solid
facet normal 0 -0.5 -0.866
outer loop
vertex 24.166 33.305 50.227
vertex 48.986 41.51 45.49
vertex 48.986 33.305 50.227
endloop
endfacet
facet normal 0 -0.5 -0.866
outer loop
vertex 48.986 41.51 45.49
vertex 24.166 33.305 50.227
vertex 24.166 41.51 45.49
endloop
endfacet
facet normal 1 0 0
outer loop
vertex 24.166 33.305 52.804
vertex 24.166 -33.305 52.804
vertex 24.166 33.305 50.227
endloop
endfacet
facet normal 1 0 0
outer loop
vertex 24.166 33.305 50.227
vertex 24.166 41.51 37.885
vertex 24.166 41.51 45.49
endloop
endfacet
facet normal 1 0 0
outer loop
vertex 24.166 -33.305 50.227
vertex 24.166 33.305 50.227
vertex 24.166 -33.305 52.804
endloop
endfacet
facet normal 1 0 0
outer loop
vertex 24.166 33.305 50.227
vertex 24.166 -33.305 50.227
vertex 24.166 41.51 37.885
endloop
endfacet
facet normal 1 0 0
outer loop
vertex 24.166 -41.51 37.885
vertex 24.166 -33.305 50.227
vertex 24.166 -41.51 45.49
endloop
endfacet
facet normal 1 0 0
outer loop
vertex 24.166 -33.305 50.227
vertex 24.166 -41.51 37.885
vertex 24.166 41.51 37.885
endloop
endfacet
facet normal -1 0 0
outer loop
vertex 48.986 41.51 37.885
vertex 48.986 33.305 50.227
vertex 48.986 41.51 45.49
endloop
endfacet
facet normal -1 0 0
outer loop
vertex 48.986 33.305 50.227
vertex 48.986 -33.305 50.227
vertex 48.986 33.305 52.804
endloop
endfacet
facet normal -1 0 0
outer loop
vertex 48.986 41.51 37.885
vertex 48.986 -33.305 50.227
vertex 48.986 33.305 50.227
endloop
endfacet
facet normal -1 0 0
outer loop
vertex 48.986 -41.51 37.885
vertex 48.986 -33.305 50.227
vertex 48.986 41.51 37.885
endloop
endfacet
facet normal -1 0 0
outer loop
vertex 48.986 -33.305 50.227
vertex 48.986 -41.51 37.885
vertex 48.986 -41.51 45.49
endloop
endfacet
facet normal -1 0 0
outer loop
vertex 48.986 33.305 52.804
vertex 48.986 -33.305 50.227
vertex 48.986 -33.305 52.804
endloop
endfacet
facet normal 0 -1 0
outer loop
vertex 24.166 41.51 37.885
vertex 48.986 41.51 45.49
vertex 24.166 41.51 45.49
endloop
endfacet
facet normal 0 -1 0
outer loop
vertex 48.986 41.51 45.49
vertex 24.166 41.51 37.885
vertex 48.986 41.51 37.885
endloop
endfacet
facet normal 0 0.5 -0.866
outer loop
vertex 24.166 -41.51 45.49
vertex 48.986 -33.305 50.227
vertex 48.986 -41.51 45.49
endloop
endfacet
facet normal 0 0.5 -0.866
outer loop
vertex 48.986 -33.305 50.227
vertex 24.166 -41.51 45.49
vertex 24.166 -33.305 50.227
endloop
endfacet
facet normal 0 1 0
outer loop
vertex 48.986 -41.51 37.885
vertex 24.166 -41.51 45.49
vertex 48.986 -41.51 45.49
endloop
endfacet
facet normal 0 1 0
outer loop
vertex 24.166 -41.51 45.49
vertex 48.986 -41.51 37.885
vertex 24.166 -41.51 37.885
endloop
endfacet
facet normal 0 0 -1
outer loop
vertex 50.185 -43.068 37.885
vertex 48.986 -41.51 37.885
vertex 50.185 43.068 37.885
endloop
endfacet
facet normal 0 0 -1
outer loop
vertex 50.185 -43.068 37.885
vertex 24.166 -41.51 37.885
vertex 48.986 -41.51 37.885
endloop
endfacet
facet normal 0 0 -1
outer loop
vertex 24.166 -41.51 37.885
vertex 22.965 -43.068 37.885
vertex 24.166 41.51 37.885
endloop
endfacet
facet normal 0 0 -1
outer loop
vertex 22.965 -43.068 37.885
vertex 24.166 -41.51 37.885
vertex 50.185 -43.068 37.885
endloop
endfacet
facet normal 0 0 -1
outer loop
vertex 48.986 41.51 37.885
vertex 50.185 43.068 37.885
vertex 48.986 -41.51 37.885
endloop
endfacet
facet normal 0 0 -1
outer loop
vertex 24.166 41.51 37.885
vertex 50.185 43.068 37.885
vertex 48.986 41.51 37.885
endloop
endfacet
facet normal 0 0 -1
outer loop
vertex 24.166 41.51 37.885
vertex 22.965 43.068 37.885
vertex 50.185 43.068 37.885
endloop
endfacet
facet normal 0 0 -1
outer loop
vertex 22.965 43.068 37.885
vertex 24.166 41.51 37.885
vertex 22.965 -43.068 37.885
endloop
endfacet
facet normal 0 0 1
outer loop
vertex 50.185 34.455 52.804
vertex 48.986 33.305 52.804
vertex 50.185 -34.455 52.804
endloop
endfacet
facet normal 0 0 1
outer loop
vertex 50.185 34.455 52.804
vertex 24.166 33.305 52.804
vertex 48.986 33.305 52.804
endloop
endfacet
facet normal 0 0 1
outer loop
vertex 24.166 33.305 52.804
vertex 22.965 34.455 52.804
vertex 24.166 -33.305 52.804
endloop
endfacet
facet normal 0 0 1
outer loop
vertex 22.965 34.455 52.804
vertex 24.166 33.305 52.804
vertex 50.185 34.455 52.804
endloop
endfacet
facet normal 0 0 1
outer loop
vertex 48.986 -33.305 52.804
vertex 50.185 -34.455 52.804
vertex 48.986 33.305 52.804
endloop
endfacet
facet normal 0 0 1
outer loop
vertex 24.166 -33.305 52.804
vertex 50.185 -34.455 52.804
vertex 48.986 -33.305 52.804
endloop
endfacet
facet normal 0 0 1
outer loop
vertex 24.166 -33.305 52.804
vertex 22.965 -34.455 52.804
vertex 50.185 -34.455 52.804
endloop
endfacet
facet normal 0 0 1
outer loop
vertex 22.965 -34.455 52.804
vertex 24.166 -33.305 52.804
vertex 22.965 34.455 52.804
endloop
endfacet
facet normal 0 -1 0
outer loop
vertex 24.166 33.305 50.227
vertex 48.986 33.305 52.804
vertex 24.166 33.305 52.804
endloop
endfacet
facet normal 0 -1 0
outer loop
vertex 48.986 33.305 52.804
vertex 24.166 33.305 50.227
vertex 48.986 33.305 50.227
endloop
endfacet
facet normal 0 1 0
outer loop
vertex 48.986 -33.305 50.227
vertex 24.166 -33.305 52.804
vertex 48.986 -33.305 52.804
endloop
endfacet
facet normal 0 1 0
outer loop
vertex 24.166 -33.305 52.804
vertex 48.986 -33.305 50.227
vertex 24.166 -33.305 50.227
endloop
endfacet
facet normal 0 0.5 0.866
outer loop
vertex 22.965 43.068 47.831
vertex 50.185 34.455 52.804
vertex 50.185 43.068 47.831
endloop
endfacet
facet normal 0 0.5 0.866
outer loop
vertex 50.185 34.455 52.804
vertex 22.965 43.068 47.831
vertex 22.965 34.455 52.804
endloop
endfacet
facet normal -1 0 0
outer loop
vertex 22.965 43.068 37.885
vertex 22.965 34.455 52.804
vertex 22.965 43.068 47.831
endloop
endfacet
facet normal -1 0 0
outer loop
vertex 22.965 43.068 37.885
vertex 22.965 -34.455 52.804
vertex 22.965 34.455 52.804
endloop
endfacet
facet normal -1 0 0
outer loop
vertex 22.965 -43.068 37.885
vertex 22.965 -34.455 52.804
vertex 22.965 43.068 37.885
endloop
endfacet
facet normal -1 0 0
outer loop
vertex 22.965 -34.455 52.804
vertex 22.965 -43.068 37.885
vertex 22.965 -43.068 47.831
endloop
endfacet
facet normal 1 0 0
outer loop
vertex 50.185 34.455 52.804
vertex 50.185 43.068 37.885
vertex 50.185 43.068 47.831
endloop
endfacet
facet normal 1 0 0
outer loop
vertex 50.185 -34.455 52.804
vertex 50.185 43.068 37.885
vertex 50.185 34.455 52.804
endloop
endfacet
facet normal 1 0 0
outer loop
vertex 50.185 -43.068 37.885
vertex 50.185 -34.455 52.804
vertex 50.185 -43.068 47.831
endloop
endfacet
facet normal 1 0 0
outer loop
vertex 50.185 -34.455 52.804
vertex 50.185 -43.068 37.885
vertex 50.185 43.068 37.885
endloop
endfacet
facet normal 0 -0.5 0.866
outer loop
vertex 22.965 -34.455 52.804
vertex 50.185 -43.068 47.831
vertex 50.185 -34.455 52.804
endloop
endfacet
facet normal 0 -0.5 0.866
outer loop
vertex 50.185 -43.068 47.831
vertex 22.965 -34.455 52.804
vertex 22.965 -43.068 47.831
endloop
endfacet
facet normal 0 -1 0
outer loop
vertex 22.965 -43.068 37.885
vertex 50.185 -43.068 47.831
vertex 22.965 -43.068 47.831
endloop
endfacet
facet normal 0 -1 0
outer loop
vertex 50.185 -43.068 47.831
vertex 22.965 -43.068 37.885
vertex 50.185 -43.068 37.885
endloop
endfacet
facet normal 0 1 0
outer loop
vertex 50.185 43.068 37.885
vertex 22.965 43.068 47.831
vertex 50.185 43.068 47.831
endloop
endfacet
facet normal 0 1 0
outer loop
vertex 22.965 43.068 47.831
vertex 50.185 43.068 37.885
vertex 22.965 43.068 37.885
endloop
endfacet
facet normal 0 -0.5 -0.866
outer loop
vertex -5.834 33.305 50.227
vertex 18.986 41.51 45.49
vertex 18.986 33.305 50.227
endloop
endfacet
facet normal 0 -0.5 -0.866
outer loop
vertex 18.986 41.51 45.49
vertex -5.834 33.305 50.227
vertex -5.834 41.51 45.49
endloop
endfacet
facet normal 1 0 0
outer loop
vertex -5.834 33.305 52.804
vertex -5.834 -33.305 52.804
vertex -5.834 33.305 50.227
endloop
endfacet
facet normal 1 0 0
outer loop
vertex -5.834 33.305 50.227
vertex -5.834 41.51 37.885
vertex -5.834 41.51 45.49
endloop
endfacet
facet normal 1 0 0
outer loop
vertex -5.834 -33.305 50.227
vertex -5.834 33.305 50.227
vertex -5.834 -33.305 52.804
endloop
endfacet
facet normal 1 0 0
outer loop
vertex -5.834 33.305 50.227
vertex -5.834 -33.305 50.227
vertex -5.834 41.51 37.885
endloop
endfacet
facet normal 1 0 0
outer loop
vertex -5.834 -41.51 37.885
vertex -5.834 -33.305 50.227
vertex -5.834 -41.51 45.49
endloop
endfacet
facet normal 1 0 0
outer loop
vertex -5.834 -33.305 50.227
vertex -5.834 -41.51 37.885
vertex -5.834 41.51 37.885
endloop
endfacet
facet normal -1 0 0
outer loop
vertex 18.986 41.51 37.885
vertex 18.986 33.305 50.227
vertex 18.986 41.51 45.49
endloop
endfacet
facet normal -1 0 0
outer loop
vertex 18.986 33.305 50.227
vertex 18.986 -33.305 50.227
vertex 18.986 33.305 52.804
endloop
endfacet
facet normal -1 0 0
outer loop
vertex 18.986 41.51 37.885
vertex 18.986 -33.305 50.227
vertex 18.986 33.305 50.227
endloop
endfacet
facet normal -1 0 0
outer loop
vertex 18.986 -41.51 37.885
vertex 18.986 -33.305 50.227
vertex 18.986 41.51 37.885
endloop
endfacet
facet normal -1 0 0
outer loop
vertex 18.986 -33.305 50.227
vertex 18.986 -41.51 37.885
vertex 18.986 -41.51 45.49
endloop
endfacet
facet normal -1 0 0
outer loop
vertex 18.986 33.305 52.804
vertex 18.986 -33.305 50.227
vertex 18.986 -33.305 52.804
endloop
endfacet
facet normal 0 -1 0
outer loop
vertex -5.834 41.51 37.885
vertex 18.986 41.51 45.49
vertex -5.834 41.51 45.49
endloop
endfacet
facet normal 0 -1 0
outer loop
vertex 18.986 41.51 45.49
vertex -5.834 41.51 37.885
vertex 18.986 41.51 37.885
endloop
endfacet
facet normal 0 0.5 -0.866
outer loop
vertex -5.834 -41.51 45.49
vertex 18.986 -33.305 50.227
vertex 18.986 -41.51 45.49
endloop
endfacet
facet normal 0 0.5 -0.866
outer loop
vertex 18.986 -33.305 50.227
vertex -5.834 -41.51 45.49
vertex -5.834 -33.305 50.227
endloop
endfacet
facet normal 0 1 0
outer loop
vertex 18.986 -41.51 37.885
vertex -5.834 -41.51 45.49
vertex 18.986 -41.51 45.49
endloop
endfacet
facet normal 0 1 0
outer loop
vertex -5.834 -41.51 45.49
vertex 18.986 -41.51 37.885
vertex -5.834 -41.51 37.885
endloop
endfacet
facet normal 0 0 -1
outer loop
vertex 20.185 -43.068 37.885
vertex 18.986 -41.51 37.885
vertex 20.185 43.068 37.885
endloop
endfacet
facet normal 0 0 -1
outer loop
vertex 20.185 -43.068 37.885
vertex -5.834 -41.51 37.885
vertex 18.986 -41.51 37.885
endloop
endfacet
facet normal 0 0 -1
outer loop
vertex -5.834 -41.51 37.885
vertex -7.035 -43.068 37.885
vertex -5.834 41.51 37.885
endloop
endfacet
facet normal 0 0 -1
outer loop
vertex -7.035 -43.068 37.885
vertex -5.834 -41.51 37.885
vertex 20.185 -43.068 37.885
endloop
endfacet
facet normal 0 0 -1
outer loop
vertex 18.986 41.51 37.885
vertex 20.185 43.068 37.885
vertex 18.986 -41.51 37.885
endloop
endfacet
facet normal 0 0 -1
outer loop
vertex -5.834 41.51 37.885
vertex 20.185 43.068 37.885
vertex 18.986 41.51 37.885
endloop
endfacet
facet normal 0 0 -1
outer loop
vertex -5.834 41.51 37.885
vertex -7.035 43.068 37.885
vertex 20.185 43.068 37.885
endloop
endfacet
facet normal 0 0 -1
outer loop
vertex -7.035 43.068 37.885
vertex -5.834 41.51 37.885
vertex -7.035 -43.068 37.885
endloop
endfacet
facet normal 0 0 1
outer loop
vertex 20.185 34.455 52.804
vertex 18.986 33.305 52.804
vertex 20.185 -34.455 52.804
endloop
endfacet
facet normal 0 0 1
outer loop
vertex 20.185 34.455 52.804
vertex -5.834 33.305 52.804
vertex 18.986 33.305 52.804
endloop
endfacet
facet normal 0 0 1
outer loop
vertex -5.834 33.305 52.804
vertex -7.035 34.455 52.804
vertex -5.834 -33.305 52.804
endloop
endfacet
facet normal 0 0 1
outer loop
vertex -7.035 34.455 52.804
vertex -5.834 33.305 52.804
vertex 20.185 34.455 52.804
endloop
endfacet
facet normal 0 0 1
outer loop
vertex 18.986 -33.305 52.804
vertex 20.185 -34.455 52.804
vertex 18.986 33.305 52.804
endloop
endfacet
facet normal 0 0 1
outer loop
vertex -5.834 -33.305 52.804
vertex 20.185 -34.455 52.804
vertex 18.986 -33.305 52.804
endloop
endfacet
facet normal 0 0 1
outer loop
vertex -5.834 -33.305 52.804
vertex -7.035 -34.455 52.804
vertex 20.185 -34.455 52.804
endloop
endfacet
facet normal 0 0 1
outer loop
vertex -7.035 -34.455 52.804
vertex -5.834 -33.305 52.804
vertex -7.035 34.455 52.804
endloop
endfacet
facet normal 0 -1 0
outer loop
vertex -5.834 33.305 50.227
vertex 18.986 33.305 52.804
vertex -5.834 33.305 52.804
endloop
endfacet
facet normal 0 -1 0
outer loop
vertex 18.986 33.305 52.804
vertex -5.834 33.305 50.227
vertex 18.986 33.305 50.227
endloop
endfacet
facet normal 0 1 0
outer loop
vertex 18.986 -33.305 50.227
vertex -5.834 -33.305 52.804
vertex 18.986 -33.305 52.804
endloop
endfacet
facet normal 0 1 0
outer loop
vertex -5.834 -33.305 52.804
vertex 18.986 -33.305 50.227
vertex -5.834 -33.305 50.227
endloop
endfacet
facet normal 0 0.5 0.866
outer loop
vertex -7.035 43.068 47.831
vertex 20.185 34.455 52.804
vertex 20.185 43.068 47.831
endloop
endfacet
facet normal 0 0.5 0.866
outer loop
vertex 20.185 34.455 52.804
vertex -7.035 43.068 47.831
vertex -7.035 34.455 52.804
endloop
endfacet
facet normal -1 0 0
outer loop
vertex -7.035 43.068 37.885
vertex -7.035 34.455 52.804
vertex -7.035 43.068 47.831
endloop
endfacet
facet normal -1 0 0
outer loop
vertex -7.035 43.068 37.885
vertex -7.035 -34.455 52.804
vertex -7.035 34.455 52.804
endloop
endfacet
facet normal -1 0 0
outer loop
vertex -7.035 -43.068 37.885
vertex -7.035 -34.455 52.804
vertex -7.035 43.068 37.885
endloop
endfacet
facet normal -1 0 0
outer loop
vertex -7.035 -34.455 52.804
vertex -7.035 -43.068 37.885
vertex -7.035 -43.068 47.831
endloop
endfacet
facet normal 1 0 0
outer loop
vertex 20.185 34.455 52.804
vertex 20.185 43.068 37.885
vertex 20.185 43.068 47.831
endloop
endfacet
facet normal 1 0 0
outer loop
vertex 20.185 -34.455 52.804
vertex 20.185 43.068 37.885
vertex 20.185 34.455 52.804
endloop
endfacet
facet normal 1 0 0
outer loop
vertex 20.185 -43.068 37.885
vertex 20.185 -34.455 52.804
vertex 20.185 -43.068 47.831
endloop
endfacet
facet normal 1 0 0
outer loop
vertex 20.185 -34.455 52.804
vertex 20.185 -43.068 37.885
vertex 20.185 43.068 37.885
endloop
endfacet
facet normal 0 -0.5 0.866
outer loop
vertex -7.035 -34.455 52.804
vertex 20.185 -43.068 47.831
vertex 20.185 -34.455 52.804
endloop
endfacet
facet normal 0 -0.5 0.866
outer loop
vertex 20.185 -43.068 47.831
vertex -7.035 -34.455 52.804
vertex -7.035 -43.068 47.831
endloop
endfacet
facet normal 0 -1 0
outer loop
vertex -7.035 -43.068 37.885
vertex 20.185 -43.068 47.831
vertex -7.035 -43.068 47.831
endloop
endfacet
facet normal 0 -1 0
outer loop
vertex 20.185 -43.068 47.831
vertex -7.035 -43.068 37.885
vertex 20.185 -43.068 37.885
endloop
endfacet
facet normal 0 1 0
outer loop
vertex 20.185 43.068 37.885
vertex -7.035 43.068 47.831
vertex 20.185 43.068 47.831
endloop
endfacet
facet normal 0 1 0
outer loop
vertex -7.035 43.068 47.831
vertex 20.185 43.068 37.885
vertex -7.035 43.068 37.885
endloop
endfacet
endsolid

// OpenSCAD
use <mylib.scad>;
p = .001;
pp = 2 * p;
t0 = 1.2;
f = .18;
sqrt3 = sqrt(3);    // 1.732
sqrt3_2 = sqrt3/2;  // .866

h0 = 3.125*25.4;    // "ideal" size of cardboard hex (3 1/8 inch)
h2 = h0 + f ;       // 2H; H = 15.625 + fudge or shrinkage; + .9 mm / 5 gaps
// radius of each hex; h2 is the measured ortho size (+ ~f)
r = (h2/2) / sqrt3_2;
echo("h2 =", h2, "r = ", r);

dr = t0/2; // ~1 mm, enlarge hex radius of box
dz = 25/19;  // thickness of tile

// 3.125 = 2H; R, H=sqrt3*R/2; R = H*2/sqrt3

// squeeze-box to hold hextiles

// a hex shaped card
module hexagon(tr=[0,0,0], r = r, t = dz, center = true) {
  tr = def(tr, [0,0,0]);
  trr(tr) trr([0,0,t/2]) cylinder(h = t, r=r, $fn=6, center = center);
}

function edges(i, r = r, h = 10) =
  let(
    x0 = 0,
    x1 = r * .75,
    y1 = r * sqrt3_2,
    y2 = y1/2,
    z0 = h/2-p
  )
  [
    [+x0, +y1, z0, [0, 0,     0],  "N"],
    [+x1, +y2, z0, [0, 0,   -60], "EN"],
    [+x1, -y2, z0, [0, 0,  -120], "ES"],
    [+x0, -y1, z0, [0, 0,  -180],  "S"],
    [-x1, -y2, z0, [0, 0,  -240], "WS"],
    [-x1, +y2, z0, [0, 0,  -300], "WN"],
  ][i];

module hexwall(dir = 0, h = 10, r = r, t = t0, center = true) {
  trr(edges(dir, r, h)) cube([r+.57*t, t, h], true);
}


// two shells to join together... fails
module splitwall(dir = 0, h = 10, r = r, t = t0, f = f) {
  ff = f/3;
  dx = -1.5 * t; xl = r + dx; 
  dy = t + ff;
  trr(edges(dir, r, h)) 
  union() {
    translate ([+xl/4+ff,  0, 0]) cube([xl/2, t, h], true);
    translate ([-xl/4-ff, dy, 0]) cube([xl/2, t, h], true);
  }
}

module hexring(r0 = r, r2 = r + dr) {
  z = 1.2*t0;
 color("red") difference()
  {
    hexagon([0,0,0], r2, t0);
    hexagon([0,0,0], r0, 2*t0);
    translate([-r2, -r2, -z/2]) cube([r2-r0/2, 2*r2, z]);
  }
}

// hexbox with splitwall
module hexbox(r = r) {
  ff = f/3;  // try make tight
  rr = r + 2 * (2*dr + ff);
  difference() {
    union() {
      color("cyan") hexagon([0, 0, 0], rr);
      trr([0, 0, t0-p]) hexring(r-.5, r + 2*dr+t0);
    }
    // cut off two sides of hexbox:
    translate([-rr*.75, 0, 0]) cube([rr/2, 2*h2, 1.2*t0], true);
  }
  for (i = [0 : 3] ) 
    splitwall(i, 20, r + dr/2, t0, ff );
}

// solid cylinder with fn sides:
module polycylinder(h, fn = 6, r=10, trr) {
  trr = def(trr, [0, 0, 0]); // or [0, 0, -h/2]; to center-z

  $fn = fn;
  trr(trr)
  linear_extrude(h )
  circle(r);
}

function da(a, r, r0 = 60) = (sin(r0+a)-sin(r0))*r;

hr0 = r;
hr = hr0+min(hr0,da(30, hr0)); // extend to hold rotated hexes +da(hr0, 30)

/**
4 sided hex box; truncated on x
@param h: interior height
@param r: interior radius
@param t: wall/end thickness
@param trr: tr & rot & ctr
*/
module hexBox(h=10, r=5, t=t0, trr) {
  trr = def(trr, [0, 0, 0]); // or [0, 0, -h/2]; to center-z
  rr = r + 1.5*t0; 
  hh = h + 2*t0; 
  h2 = rr * sqrt3;
  k1 = 1.3;
  k2 = .4 * rr; // inset from end of box
  trr(trr)
  differenceN(1) 
  {
  // %  trr([-rr + k2/2, 0, 15])  cube([k2, .1 + k2*sqrt3*2, 32],true);
    translate([0, 0, -p])  
    polycylinder(hh, 6, rr); // outer shell: h+2*t0 X r+2*t0
    translate([1.2*t0+p, 0, t0])
    polycylinder(h, 6, r);  // interior space: h X r

    // cut off two sides of hexbox:
    // cut large base end:
    translate([rr*(1-k1/2), 0, hh/2]) cube([rr*k1, h2+pp, hh+2*pp], true);
    // cut hole on pointy end
    trr([-rr + k2/2, 0, 15])  cube([k2, .1 + k2*sqrt3*2, 32],true);
    // drill cube to square off the edge
    trr([2-rr + k2, 0, h/2+t0]) cube([6, .1 + k2*sqrt3*2-2*t0, h],true);
  }
}

// loc = 0: with cards, 1: print, 2: design, 3: wtf?
loc = 1; nt = 19; hz = nt * dz - f;  // -f to make it sticky/stretch

atrans(loc, [[0, 0, 1*t0], undef, undef, 0])
  astack(nt, [0, 0, dz]) color("pink") hexagon(undef, r, dz-f);

atrans(loc, [[1.5*t0, 0, 0], [0, 0, 0, [0, 90, 0, [r/2, 0, 0]]], [0,0,0], [0, 0, -.5]])
  // color("skyblue")
  { astack(2, [0, 0, -30]) hexBox(hz, r+2, 1); }


// splitwall hexbox does not work, the wings just break off
// *atrans(loc, [[0,0,0], [0,0,0], [h2+4*t0, 0, 0]])
//   dup([[0, 0, 10, [ 180, 0, 0, [0, 0, 9]]], [+26-h2, 0, 0, [ 0, 0, 180, [0, 0, 00]]]][loc])
//     hexbox(r + 3);
